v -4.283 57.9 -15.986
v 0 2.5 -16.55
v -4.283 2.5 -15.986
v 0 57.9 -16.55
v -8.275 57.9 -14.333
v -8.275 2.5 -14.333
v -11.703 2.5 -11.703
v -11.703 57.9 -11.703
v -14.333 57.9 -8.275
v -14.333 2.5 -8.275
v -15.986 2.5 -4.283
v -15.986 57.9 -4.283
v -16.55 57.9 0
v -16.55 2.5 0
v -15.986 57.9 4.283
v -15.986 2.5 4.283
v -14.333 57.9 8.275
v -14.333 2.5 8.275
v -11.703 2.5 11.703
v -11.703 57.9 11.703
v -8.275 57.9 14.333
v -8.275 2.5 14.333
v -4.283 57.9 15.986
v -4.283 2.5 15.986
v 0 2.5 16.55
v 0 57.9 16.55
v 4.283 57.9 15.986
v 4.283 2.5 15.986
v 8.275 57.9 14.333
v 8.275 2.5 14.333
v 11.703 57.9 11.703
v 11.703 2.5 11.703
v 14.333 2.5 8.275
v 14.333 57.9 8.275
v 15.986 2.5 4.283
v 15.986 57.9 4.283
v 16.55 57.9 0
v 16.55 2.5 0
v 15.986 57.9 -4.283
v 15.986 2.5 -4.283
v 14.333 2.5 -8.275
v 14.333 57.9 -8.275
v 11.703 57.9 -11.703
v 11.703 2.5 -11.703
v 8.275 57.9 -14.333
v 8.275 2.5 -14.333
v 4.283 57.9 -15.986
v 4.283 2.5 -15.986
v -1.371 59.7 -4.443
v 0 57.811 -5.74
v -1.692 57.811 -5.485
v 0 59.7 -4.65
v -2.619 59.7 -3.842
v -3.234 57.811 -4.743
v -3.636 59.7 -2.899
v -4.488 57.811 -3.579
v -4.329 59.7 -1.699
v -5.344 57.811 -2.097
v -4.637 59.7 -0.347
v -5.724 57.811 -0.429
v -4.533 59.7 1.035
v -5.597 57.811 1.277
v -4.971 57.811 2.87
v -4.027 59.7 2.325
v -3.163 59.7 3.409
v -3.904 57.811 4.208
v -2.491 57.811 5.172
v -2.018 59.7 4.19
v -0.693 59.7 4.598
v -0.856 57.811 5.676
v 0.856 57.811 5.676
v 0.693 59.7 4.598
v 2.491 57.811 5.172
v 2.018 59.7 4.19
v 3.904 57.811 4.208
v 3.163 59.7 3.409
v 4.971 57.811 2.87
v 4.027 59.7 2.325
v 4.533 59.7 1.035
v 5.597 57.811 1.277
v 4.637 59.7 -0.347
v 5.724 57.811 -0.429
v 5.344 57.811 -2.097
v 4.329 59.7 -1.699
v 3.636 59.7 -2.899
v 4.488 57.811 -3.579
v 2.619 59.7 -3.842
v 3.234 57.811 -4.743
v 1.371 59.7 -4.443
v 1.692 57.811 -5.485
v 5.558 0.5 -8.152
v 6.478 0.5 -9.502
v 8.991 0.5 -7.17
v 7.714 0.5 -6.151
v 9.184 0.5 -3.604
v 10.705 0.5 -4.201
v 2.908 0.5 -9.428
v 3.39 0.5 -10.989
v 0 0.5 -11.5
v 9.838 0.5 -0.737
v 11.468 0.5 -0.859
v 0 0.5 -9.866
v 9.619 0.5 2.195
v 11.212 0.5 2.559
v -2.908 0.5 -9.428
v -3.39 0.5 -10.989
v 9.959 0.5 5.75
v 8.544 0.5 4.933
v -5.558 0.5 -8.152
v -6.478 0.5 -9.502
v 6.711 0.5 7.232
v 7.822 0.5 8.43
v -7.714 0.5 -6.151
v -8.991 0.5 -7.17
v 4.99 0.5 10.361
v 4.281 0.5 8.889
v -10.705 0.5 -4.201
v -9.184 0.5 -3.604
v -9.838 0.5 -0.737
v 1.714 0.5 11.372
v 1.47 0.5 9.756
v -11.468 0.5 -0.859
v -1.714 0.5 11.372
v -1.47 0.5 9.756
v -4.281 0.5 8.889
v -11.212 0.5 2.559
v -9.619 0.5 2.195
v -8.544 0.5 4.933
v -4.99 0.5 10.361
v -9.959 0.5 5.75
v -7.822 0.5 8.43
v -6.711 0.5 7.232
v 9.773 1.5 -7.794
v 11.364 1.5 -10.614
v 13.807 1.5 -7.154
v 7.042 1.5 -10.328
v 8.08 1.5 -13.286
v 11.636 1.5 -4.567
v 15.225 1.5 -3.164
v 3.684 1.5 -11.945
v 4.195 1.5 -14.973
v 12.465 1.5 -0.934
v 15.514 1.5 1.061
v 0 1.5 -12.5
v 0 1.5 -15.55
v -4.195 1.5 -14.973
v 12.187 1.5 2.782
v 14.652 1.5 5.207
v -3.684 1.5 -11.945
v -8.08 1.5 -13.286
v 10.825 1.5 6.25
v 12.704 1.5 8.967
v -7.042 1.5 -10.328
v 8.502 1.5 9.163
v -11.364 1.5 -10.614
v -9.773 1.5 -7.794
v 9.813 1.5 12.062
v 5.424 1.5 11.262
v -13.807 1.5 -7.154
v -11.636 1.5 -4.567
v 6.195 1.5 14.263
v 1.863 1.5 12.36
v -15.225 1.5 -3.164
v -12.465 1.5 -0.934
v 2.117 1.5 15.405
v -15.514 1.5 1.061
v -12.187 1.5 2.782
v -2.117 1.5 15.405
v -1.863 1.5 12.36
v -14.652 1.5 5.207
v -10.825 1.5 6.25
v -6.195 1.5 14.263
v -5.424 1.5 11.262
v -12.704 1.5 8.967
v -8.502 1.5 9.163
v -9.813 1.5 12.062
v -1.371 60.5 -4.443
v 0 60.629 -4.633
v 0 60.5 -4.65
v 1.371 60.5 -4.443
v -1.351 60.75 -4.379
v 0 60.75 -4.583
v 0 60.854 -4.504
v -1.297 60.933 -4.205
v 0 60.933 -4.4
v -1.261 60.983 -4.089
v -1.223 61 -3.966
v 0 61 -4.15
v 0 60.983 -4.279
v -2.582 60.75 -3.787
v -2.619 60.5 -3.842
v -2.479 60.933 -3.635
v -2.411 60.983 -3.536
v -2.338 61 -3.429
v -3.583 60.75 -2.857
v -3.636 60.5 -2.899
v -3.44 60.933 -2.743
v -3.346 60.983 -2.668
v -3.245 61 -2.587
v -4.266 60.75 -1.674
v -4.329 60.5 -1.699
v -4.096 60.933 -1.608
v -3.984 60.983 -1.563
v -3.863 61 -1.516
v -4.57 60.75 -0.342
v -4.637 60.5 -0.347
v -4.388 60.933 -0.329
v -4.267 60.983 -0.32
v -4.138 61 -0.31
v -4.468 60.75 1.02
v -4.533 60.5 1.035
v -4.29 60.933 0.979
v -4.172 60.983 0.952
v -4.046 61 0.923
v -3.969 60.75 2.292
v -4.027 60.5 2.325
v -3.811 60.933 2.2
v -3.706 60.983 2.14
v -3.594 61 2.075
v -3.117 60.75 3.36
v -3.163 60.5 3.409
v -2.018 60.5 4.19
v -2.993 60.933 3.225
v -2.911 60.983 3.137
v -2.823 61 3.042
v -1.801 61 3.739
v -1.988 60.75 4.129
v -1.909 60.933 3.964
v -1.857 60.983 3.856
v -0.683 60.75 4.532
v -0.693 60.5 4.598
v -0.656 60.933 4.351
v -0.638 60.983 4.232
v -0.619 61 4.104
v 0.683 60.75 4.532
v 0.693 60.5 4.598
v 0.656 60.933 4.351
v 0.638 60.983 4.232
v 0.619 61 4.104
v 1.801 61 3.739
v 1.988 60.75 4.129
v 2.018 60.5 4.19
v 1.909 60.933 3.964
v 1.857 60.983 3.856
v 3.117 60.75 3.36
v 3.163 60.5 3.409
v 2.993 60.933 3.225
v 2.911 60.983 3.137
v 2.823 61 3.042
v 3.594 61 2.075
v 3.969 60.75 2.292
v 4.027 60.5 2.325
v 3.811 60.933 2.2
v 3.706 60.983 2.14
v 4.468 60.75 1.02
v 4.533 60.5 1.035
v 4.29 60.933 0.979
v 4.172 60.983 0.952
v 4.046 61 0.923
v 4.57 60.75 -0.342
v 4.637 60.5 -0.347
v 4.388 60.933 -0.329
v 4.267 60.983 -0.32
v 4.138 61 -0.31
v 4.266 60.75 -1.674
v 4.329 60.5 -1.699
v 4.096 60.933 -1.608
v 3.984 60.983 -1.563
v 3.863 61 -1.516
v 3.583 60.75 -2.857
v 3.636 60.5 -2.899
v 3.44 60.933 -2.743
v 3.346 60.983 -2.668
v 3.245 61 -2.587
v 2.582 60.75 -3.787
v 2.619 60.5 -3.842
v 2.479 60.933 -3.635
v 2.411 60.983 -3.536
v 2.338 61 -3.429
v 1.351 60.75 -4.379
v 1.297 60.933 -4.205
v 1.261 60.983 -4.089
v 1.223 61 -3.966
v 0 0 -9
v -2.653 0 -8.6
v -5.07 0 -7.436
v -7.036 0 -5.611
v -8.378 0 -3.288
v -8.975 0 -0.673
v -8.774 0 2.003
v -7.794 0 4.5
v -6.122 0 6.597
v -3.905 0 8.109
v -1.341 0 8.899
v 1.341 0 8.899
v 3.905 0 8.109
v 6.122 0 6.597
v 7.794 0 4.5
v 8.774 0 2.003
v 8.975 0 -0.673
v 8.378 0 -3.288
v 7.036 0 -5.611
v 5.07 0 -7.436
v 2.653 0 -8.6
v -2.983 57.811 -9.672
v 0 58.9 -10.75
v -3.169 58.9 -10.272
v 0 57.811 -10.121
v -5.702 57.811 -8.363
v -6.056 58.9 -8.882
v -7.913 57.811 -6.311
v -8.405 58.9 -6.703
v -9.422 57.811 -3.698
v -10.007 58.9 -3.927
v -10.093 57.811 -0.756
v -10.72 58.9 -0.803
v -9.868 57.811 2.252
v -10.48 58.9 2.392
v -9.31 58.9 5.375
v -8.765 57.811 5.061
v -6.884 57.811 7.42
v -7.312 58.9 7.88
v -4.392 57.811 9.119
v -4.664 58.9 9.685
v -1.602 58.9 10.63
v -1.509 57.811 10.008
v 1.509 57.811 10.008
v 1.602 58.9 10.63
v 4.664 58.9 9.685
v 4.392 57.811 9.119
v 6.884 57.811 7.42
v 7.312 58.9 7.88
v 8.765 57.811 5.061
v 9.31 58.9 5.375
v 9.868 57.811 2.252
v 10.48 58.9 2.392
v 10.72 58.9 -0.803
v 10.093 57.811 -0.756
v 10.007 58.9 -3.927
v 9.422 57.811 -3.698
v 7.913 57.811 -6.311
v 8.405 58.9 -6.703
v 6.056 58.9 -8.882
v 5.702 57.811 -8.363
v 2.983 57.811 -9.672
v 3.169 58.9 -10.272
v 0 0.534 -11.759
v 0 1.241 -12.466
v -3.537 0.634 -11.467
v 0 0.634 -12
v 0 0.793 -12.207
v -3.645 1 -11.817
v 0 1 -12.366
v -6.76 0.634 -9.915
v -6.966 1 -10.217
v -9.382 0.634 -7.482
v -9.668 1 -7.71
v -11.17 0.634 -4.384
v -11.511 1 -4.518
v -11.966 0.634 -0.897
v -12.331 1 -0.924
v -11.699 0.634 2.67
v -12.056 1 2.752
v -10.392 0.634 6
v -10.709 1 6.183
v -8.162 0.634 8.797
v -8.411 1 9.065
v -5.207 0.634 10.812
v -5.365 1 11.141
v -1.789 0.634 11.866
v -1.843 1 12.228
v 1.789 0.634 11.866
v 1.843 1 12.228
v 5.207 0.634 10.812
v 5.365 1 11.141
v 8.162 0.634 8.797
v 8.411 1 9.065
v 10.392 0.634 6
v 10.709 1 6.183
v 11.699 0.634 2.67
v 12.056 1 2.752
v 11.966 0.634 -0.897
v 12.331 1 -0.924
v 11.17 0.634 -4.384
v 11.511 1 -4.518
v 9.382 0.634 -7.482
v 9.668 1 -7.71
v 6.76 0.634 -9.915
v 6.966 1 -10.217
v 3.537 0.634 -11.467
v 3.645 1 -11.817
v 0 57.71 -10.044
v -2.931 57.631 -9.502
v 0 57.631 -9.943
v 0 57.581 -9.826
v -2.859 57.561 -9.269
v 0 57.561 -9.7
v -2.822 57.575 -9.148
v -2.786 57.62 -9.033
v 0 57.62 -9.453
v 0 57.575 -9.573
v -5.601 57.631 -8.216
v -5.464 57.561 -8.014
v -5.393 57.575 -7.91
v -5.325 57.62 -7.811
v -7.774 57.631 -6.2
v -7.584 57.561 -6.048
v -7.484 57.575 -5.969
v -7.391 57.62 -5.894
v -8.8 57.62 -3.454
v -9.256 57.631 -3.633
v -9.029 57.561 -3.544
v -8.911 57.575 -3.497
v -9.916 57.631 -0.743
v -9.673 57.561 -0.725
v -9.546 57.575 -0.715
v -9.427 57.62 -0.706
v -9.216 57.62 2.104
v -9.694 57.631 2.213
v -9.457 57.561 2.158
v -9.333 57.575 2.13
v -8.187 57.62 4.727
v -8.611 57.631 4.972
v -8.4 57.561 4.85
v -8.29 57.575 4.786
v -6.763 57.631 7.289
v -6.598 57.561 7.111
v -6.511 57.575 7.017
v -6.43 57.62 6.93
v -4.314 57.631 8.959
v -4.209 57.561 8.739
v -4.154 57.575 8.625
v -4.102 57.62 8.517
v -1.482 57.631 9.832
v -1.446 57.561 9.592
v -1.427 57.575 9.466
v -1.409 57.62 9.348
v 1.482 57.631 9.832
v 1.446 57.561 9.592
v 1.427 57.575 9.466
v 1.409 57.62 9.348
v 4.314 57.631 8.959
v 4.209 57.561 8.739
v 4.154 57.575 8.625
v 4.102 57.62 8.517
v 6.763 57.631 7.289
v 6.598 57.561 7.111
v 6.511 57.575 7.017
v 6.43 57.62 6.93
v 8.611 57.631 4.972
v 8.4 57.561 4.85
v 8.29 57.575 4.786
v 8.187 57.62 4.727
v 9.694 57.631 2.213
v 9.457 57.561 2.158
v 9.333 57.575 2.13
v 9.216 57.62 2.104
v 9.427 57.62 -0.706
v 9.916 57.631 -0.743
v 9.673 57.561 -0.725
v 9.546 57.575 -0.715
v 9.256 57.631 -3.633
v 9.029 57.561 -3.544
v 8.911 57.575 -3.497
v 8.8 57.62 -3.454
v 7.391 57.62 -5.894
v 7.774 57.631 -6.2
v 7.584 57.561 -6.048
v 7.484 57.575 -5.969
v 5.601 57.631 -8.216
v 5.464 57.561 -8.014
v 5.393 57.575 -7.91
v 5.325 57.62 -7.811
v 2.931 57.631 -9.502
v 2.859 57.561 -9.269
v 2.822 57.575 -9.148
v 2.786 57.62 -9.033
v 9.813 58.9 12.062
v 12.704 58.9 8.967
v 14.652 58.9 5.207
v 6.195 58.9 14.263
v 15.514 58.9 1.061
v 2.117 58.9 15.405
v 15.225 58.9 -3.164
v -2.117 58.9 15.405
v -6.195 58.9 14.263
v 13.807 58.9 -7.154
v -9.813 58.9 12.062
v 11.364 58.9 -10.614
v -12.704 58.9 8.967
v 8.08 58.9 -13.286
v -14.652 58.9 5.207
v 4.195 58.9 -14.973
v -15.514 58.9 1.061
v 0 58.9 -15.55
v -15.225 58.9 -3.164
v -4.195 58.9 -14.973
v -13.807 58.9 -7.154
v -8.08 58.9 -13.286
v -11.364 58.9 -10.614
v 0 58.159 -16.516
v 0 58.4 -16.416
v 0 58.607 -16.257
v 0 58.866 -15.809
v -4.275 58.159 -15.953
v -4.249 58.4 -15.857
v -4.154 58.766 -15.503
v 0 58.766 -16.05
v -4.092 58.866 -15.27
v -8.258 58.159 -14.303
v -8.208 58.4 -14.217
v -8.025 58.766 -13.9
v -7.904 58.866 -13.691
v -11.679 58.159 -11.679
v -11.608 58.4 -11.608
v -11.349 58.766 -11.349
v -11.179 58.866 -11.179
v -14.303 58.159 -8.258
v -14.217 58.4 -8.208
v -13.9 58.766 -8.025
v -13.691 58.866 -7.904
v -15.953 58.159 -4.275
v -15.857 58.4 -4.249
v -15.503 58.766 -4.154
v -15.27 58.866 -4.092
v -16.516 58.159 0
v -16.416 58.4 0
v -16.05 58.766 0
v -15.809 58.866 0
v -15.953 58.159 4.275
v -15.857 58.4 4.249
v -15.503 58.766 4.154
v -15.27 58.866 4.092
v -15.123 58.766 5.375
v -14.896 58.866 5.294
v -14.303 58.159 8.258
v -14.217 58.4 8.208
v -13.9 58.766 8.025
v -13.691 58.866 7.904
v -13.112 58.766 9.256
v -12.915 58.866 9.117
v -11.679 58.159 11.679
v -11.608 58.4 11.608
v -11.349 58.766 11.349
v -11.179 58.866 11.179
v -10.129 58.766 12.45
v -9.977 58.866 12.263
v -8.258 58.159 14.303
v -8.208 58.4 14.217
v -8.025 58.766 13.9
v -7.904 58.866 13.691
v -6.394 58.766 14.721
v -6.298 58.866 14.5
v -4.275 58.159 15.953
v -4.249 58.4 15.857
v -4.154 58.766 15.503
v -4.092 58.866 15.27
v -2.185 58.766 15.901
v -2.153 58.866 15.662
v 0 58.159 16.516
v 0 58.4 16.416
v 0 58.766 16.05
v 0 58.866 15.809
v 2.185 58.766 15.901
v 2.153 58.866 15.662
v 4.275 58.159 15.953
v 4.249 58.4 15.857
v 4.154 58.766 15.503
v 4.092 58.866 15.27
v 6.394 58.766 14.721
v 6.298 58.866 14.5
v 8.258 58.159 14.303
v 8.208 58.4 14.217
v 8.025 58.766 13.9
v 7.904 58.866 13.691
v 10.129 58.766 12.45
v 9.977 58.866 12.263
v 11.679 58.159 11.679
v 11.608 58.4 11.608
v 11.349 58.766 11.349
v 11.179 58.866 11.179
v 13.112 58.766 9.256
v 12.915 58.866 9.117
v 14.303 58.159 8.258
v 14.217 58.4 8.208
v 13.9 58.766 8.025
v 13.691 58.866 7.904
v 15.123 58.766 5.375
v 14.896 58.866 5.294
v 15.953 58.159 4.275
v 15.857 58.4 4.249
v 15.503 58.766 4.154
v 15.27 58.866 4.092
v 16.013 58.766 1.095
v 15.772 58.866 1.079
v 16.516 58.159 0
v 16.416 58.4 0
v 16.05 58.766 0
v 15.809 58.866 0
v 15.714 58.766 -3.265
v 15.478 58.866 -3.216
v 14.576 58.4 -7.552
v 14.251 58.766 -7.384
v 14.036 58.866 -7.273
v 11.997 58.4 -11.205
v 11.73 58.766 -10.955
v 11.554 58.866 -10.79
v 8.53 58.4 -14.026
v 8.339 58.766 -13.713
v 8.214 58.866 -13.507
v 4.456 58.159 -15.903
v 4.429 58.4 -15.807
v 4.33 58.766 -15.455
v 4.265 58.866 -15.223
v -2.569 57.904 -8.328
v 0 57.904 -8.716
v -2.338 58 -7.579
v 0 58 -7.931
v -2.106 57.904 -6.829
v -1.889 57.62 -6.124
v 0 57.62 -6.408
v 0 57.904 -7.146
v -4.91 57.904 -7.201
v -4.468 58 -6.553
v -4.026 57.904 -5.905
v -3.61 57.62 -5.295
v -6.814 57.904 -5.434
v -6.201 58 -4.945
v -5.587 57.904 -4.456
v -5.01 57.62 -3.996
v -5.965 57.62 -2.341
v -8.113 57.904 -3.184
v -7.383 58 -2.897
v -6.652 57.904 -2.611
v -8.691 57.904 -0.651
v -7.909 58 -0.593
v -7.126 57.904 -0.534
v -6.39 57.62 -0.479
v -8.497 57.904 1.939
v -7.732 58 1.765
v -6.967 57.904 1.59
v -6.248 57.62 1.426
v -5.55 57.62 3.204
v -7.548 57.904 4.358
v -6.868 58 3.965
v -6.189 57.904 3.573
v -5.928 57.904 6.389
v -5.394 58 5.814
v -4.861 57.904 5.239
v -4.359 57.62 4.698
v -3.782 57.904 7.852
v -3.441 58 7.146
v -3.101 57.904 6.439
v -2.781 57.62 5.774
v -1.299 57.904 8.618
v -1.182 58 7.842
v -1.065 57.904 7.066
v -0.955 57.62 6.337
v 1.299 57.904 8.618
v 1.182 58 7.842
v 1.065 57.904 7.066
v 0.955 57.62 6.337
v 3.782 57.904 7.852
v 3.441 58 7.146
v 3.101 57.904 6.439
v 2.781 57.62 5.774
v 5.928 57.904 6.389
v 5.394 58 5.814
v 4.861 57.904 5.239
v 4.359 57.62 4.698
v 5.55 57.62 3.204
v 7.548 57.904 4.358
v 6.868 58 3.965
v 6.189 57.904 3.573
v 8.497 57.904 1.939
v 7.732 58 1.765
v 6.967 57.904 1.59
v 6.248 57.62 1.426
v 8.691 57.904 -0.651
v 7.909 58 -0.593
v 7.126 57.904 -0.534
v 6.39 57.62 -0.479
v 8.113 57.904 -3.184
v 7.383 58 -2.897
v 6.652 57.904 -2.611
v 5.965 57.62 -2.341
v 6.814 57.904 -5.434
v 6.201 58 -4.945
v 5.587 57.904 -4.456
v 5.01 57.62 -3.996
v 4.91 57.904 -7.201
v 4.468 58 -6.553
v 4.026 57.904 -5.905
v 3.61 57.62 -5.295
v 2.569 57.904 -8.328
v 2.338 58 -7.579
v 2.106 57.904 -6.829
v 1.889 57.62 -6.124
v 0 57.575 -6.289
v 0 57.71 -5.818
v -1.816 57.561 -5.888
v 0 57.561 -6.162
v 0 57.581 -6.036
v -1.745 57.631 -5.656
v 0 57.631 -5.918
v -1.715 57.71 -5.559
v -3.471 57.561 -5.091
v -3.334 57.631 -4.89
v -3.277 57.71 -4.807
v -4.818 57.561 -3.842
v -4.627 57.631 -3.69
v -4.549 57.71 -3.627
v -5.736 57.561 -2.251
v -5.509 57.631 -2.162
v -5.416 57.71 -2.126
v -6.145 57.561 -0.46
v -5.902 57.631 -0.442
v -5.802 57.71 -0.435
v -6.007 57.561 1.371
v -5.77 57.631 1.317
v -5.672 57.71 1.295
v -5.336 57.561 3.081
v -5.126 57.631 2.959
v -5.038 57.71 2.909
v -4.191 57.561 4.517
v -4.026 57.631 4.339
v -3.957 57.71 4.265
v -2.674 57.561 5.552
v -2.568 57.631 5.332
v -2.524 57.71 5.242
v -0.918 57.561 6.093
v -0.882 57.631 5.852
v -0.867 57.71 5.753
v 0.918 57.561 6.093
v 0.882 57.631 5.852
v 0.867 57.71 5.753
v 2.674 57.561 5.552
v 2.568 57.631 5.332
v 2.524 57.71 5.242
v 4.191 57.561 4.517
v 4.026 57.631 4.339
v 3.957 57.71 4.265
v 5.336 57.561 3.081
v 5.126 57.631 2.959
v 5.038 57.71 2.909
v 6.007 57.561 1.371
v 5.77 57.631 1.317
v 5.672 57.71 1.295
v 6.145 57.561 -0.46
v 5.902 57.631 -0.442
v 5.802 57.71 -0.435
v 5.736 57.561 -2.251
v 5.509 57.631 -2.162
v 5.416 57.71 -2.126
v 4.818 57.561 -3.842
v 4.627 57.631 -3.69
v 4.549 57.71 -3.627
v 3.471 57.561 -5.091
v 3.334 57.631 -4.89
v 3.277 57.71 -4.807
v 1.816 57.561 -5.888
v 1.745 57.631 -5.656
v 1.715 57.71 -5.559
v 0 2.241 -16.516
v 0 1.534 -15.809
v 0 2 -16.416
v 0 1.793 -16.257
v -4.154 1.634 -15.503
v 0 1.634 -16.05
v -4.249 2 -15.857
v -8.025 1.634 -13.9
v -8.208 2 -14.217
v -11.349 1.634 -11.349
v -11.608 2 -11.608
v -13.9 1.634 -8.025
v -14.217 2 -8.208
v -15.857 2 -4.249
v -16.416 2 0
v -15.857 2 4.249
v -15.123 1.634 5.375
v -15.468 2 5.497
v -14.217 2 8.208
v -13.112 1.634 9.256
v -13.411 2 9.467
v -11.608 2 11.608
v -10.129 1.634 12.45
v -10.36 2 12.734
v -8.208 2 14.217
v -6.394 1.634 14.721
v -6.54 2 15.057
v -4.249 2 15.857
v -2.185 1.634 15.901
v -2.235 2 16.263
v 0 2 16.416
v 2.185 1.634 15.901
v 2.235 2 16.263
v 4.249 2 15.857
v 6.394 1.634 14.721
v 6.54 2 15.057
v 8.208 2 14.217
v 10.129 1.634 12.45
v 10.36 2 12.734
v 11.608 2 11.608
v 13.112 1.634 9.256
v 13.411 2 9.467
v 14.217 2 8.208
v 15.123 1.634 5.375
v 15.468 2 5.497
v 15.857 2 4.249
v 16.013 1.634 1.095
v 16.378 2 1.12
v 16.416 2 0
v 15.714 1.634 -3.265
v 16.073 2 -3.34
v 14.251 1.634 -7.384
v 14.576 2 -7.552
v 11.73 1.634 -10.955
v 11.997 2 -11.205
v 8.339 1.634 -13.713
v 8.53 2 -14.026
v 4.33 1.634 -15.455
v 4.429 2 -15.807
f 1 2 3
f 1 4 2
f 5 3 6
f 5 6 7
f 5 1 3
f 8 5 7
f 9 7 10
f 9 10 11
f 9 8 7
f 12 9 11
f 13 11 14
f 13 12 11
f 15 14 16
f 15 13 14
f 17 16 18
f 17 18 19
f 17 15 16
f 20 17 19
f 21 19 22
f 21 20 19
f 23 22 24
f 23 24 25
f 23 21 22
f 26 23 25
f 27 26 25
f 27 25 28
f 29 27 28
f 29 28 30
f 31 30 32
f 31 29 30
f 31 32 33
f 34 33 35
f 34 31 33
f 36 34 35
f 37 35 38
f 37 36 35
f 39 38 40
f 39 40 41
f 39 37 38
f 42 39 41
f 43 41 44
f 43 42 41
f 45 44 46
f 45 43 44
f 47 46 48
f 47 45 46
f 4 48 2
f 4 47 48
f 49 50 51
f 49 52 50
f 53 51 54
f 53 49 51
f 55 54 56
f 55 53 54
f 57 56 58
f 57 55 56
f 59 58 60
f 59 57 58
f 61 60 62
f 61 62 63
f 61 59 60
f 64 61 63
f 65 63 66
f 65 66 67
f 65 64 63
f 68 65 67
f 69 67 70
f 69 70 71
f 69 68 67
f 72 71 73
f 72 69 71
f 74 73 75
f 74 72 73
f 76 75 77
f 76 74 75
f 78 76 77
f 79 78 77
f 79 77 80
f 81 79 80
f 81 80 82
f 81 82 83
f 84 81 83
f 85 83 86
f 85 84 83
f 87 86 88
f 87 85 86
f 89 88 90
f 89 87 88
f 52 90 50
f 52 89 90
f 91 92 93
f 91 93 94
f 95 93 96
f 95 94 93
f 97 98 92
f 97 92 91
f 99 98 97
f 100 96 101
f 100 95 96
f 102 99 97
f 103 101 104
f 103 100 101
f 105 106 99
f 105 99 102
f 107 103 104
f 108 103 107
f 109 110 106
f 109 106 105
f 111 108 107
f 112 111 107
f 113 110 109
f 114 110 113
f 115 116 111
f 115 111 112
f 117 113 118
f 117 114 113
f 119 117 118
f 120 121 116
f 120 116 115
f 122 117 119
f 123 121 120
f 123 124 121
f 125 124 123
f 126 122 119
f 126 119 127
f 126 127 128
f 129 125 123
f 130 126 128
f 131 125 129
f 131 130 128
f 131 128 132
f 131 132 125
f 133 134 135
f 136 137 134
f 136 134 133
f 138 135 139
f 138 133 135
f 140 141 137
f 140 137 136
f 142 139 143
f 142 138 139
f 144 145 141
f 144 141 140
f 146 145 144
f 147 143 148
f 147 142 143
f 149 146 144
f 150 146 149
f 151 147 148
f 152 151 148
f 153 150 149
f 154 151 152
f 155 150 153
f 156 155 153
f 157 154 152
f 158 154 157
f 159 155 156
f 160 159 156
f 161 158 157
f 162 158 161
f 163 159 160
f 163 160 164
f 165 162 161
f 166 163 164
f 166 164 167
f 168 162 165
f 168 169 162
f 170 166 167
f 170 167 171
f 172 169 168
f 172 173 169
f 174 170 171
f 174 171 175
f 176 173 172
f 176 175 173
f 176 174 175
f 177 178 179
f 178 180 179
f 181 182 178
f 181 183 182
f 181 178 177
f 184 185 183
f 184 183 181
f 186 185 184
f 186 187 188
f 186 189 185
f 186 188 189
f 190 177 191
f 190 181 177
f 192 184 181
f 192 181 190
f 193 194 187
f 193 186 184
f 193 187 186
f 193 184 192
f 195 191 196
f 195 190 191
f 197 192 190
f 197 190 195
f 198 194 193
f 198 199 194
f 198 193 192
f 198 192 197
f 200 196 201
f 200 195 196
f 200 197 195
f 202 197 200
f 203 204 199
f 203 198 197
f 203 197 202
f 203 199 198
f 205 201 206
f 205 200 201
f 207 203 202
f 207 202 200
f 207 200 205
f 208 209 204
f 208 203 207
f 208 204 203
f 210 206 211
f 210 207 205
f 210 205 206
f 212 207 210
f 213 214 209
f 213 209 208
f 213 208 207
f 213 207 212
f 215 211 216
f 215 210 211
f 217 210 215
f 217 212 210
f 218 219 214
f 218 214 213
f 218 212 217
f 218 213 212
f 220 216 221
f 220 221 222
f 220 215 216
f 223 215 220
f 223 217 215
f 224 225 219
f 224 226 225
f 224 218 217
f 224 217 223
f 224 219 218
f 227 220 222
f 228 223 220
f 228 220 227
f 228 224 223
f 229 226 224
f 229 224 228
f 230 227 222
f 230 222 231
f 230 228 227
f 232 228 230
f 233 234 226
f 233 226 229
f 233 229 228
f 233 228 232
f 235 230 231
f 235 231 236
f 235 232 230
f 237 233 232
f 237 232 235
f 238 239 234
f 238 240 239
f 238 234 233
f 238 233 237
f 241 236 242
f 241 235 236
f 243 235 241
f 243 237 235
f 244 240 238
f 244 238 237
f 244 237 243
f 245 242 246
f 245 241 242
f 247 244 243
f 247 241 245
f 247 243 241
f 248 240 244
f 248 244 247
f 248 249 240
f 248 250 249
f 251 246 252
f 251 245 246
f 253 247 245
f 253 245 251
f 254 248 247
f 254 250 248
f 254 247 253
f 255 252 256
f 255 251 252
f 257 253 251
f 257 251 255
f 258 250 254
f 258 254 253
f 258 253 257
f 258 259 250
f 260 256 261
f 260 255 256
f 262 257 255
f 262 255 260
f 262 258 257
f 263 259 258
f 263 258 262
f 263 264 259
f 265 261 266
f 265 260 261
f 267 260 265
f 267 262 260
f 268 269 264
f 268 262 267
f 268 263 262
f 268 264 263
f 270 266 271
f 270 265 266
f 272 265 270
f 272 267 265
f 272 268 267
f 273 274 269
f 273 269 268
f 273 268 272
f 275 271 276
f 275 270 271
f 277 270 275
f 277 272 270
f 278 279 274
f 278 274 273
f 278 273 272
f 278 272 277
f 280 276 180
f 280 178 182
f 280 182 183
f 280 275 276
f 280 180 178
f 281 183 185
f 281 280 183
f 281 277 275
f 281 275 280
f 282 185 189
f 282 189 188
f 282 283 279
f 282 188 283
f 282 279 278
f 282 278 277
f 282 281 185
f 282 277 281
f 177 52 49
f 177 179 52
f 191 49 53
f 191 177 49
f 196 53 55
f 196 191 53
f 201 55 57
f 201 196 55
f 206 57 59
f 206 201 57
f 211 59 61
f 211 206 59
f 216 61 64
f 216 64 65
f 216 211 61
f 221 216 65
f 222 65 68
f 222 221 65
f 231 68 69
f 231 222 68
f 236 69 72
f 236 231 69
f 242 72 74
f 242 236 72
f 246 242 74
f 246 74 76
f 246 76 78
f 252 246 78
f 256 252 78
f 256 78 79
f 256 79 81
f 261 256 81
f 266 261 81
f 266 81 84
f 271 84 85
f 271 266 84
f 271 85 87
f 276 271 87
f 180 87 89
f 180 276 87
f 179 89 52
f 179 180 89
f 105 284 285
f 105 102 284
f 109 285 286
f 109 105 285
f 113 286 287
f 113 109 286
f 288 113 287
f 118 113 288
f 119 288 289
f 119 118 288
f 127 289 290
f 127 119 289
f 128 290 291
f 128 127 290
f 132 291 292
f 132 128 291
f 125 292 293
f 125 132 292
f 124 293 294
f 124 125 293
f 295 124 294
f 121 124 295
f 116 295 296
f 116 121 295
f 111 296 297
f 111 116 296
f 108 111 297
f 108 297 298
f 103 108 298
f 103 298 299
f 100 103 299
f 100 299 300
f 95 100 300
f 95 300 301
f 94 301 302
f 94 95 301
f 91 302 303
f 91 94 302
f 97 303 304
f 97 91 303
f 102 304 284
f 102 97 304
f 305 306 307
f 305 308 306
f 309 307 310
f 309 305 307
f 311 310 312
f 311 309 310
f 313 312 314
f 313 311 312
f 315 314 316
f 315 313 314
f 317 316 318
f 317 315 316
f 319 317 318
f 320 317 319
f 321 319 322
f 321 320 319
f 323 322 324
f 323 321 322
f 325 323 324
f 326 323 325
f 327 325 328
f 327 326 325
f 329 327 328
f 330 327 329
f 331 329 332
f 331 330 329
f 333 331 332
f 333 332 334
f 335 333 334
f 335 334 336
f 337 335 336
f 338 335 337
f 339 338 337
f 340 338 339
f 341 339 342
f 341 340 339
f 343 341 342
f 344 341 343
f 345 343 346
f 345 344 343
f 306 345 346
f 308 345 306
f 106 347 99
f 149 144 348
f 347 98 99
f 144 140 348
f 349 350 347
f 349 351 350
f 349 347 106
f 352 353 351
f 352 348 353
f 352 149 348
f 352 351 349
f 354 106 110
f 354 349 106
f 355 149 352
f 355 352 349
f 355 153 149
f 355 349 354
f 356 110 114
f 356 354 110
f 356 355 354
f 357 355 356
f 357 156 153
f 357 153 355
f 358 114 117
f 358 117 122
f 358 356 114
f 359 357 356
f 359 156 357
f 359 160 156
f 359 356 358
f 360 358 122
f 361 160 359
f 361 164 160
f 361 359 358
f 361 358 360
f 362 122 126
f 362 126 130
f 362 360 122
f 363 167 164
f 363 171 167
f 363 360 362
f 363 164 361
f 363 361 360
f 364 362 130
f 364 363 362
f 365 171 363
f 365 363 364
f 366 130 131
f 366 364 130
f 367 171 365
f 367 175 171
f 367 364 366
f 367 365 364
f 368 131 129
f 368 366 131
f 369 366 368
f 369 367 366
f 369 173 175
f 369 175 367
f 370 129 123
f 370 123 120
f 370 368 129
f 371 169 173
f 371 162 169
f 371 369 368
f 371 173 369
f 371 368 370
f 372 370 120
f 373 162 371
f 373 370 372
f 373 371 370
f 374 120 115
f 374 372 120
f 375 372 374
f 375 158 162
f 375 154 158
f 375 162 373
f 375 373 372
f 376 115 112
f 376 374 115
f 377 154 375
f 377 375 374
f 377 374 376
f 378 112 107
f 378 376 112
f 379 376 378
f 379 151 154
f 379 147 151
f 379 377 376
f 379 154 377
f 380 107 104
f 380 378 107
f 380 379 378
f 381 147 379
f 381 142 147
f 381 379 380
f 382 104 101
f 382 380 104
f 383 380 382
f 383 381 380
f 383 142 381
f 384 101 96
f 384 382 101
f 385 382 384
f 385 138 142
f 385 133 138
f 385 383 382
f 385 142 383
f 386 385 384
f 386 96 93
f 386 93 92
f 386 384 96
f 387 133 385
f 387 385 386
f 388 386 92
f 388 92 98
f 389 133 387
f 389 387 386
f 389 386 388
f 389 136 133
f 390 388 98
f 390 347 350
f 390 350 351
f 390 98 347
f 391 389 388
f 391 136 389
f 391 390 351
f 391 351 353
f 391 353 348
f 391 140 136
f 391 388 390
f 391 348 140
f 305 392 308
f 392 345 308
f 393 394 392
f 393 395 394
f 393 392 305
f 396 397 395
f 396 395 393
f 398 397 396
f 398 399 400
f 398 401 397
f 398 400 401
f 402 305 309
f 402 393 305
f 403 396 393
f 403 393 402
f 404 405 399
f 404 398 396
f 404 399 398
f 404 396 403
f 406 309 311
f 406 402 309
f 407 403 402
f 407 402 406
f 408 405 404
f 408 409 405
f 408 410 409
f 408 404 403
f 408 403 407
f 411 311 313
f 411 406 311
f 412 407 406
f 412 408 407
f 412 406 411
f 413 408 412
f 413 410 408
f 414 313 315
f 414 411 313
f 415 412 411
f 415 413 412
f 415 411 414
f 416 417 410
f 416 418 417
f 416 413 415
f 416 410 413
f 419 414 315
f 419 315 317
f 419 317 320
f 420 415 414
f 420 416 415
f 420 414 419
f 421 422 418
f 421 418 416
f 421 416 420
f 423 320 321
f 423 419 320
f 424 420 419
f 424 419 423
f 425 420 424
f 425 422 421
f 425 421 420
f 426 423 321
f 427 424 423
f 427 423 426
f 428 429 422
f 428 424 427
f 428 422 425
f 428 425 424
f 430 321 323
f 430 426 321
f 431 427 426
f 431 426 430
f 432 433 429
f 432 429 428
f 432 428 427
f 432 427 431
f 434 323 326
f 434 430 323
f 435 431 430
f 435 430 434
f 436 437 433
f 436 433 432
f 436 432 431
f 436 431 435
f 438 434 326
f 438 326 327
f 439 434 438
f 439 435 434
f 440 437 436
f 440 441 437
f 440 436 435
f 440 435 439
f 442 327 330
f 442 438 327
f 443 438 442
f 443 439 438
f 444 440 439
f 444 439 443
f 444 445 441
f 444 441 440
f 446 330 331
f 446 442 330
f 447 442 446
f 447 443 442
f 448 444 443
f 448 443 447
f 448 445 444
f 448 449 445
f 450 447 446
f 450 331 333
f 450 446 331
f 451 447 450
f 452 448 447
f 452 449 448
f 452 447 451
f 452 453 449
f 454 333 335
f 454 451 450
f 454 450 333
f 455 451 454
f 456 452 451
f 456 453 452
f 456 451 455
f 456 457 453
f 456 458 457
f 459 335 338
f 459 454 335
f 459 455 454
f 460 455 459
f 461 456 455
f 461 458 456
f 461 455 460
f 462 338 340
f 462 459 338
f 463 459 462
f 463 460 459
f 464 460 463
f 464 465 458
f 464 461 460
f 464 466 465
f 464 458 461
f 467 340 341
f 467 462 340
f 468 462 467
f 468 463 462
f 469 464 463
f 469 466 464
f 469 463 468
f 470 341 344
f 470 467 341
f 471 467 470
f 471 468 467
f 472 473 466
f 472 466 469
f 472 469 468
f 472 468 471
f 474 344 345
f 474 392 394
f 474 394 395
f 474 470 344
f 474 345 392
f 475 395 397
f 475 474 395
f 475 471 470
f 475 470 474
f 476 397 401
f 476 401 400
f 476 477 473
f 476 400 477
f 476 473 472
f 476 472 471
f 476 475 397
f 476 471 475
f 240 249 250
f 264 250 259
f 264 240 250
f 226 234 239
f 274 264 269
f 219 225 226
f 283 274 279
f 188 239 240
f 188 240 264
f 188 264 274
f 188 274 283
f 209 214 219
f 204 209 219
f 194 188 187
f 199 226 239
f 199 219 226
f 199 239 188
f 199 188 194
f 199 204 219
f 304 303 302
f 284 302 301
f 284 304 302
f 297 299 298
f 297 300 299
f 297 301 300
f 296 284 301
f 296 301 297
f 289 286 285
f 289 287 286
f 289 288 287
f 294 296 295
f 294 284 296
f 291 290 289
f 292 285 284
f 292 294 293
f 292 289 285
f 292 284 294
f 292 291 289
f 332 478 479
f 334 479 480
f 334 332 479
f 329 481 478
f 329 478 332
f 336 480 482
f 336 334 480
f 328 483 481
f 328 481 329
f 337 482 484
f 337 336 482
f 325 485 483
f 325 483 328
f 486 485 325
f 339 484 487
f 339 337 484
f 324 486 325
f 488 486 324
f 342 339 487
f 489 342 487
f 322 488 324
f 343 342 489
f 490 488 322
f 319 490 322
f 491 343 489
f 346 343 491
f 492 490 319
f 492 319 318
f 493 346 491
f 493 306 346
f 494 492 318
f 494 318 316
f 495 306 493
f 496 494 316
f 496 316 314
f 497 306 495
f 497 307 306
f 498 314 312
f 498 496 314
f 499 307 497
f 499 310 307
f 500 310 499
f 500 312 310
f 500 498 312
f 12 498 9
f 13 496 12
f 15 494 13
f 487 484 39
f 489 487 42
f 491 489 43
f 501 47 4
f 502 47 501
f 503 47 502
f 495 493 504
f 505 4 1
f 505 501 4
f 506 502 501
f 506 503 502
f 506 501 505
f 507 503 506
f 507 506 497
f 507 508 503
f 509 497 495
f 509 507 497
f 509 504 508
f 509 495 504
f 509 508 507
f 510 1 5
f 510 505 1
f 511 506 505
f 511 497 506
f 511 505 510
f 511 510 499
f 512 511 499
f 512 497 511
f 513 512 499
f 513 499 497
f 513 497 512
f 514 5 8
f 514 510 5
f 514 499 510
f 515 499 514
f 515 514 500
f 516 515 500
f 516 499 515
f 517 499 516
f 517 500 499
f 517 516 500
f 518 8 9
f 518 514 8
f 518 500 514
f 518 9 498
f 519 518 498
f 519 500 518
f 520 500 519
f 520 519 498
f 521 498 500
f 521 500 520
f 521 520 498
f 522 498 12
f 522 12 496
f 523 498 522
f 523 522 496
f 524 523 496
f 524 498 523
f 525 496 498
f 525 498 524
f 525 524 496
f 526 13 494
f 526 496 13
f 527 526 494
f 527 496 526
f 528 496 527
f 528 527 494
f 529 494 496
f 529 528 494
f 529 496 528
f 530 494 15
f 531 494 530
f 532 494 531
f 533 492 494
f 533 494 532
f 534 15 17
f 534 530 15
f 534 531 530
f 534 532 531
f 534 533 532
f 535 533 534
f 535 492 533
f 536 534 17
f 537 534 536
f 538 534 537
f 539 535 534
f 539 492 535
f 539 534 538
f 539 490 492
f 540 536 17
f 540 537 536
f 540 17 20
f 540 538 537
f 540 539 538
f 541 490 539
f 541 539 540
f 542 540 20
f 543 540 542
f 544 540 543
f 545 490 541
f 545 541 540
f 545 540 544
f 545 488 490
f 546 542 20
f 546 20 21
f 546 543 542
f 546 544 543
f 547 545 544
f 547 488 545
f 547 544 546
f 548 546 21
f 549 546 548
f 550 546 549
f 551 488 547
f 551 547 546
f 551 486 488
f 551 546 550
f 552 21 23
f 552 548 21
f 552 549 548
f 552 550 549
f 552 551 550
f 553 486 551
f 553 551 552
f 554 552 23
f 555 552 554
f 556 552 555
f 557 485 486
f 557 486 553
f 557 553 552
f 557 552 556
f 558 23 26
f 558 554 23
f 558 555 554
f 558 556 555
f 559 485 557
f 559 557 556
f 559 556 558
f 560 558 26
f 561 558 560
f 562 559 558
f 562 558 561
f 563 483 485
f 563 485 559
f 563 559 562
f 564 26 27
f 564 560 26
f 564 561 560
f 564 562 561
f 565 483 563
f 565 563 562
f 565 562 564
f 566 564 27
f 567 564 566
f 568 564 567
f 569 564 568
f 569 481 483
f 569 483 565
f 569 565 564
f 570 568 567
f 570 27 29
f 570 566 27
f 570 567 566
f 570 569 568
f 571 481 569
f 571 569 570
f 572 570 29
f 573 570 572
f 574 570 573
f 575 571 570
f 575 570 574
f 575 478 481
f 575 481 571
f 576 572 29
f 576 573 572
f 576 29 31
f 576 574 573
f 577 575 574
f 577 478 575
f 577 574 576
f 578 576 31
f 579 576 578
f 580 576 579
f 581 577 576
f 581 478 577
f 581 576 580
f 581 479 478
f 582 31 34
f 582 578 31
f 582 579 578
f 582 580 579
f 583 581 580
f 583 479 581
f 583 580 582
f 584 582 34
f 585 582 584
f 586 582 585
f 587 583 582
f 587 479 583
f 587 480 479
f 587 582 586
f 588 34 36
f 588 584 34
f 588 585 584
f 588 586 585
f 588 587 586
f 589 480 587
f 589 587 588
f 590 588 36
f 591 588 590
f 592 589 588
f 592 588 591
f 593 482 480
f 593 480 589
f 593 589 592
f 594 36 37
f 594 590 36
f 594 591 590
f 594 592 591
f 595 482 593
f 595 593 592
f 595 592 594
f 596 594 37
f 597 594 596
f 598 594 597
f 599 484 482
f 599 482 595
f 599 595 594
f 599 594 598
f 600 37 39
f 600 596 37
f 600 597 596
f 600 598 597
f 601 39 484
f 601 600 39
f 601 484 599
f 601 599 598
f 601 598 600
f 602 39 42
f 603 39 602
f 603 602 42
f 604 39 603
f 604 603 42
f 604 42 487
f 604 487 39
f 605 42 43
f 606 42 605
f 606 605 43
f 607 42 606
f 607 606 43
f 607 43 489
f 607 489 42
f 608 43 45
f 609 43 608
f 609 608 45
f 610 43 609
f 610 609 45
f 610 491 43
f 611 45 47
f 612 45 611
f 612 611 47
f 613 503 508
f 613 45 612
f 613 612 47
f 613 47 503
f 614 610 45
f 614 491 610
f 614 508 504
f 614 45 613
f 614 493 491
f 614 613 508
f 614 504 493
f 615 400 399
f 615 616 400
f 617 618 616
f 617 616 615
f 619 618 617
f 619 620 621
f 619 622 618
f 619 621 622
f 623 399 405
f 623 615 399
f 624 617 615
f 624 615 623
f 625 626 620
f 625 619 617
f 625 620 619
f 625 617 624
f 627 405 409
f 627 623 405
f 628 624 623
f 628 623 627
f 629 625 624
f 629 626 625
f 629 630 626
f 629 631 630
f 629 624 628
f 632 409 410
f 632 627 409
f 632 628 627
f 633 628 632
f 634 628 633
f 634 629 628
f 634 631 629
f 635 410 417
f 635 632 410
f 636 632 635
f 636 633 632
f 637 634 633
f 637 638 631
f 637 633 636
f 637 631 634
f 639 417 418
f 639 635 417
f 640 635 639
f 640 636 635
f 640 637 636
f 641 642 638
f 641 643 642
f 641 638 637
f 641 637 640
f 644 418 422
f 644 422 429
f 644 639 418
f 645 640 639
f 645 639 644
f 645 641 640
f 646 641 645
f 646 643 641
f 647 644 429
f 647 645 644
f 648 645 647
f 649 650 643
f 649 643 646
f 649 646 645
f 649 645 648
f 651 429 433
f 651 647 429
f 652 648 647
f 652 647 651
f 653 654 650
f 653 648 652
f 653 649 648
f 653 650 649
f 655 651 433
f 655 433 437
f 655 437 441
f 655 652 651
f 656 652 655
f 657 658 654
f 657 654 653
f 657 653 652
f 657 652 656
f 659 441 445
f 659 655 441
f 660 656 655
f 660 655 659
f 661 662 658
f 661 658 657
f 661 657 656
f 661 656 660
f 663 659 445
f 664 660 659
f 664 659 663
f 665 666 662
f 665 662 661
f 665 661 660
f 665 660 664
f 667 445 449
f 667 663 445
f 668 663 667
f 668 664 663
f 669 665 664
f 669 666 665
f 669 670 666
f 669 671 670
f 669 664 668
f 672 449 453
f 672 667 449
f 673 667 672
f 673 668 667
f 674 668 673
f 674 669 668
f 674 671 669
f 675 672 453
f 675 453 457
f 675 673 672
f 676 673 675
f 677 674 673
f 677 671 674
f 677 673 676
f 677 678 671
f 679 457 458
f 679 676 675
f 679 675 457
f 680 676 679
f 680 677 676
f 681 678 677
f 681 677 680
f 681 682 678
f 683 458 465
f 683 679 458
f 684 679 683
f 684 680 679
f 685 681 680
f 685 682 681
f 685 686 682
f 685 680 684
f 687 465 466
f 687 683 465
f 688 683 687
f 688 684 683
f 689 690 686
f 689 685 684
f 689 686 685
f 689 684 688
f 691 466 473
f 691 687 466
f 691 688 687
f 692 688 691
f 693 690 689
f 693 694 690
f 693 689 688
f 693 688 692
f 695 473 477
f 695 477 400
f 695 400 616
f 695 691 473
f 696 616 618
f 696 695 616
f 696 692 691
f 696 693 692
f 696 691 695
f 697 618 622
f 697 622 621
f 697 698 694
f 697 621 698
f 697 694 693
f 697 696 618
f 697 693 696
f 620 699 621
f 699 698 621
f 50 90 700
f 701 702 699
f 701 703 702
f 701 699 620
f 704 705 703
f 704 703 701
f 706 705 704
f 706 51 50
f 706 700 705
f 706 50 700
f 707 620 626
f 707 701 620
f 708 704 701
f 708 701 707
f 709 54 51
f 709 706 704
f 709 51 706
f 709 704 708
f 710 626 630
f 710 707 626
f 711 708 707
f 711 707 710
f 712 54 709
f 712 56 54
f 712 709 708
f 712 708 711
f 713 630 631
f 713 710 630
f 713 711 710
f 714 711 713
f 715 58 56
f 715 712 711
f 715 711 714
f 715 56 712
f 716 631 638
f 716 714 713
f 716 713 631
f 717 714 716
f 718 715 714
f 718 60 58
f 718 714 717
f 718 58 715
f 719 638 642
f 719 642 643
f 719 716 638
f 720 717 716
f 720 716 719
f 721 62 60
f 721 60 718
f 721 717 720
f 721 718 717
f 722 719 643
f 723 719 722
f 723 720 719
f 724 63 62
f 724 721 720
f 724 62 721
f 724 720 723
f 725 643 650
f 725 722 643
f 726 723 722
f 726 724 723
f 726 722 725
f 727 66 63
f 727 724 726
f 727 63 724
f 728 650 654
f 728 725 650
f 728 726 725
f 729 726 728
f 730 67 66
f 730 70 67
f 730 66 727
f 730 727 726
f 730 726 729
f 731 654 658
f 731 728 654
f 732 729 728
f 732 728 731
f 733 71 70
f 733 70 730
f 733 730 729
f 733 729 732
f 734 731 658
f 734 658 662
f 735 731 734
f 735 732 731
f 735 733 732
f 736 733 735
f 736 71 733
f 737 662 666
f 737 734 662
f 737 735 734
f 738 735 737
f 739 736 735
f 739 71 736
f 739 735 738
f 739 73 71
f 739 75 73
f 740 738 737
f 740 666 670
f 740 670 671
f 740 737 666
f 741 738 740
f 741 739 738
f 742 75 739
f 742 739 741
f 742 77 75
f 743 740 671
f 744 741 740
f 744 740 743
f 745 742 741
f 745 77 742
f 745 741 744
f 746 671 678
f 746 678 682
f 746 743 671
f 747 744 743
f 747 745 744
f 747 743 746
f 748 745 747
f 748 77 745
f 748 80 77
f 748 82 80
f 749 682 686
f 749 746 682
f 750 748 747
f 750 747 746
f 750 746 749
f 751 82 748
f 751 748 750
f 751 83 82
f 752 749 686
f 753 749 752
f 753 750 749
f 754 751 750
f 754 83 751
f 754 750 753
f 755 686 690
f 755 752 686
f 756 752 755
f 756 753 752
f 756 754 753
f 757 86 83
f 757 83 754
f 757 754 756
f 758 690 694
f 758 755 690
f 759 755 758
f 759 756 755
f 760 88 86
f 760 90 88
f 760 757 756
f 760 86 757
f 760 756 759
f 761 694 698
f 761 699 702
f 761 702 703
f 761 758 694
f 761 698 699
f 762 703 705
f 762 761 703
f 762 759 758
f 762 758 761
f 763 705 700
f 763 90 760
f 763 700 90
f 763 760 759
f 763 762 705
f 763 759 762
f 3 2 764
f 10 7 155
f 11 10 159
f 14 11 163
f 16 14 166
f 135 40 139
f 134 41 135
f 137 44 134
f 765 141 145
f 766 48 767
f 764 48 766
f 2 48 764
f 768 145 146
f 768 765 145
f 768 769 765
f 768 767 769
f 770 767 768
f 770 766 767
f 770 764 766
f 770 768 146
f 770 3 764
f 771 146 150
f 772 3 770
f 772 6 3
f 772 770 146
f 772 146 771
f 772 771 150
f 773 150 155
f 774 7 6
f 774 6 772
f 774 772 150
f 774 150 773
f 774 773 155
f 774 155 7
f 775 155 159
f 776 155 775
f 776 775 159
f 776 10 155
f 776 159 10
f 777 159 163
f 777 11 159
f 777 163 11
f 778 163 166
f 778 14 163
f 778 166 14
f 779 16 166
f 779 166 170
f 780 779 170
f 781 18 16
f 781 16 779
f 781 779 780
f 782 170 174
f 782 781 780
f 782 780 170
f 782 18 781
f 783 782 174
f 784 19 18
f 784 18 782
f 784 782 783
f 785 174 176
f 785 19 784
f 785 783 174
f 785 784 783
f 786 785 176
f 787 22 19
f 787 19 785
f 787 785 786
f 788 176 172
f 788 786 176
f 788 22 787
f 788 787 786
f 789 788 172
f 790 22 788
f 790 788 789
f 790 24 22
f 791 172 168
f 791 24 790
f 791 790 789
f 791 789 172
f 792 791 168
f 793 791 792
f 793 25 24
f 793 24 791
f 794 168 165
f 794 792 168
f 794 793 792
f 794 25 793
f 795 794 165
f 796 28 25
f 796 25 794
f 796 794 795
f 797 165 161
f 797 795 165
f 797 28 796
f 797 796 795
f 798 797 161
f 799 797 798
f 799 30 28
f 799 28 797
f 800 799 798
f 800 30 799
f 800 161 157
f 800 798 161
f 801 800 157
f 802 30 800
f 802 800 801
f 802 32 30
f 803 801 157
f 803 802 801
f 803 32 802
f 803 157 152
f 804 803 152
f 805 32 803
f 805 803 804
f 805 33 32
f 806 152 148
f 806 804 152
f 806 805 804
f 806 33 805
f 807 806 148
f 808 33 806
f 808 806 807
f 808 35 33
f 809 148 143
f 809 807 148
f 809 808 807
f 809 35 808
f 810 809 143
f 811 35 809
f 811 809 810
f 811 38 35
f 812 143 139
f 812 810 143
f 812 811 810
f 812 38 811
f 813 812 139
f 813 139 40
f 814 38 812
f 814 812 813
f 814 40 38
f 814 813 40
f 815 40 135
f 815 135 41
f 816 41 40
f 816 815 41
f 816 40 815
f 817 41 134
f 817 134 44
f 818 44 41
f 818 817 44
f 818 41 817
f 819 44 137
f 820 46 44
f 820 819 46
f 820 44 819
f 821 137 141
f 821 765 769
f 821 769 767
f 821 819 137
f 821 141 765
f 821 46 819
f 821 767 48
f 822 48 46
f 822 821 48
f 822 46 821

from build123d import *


with BuildPart() as part:
    # Sketch2 → Revolve1 (revolve)
    with BuildSketch(Plane.XY, mode=Mode.PRIVATE) as revolve1_sk:
        with BuildLine():
            Line((0, 0), (9, 0))
            Line((9, 0), (9.866025404, 0.5))
            Line((9.866025404, 0.5), (11.5, 0.5))
            ThreePointArc((11.5, 0.5), (12.207106781, 0.792893219), (12.5, 1.5))
            Line((12.5, 1.5), (15.55, 1.5))
            ThreePointArc((15.55, 1.5), (16.257106781, 1.792893219), (16.55, 2.5))
            Line((16.55, 2.5), (16.55, 57.9))
            ThreePointArc((16.55, 57.9), (16.257106781, 58.607106781), (15.55, 58.9))
            Line((15.55, 58.9), (10.75, 58.9))
            Line((10.75, 58.9), (10.121453307, 57.811325193))
            ThreePointArc((10.121453307, 57.811325193), (9.826135517, 57.580658873), (9.453477498, 57.619972344))
            ThreePointArc((9.453477498, 57.619972344), (7.930940108, 58), (6.408402718, 57.619972344))
            ThreePointArc((6.408402718, 57.619972344), (6.035744698, 57.580658873), (5.740426908, 57.811325193))
            Line((5.740426908, 57.811325193), (4.65, 59.7))
            Line((4.65, 59.7), (4.65, 60.5))
            ThreePointArc((4.65, 60.5), (4.503553391, 60.853553391), (4.15, 61))
            Line((4.15, 61), (0, 61))
            Line((0, 61), (0, 0))
        make_face()
    revolve(revolve1_sk.sketch.rotate(Axis((0, 0, 0), (0, 1, 0)), 90), axis=Axis((0, 0, 0), (0, 1, 0)))


solid = part.part
